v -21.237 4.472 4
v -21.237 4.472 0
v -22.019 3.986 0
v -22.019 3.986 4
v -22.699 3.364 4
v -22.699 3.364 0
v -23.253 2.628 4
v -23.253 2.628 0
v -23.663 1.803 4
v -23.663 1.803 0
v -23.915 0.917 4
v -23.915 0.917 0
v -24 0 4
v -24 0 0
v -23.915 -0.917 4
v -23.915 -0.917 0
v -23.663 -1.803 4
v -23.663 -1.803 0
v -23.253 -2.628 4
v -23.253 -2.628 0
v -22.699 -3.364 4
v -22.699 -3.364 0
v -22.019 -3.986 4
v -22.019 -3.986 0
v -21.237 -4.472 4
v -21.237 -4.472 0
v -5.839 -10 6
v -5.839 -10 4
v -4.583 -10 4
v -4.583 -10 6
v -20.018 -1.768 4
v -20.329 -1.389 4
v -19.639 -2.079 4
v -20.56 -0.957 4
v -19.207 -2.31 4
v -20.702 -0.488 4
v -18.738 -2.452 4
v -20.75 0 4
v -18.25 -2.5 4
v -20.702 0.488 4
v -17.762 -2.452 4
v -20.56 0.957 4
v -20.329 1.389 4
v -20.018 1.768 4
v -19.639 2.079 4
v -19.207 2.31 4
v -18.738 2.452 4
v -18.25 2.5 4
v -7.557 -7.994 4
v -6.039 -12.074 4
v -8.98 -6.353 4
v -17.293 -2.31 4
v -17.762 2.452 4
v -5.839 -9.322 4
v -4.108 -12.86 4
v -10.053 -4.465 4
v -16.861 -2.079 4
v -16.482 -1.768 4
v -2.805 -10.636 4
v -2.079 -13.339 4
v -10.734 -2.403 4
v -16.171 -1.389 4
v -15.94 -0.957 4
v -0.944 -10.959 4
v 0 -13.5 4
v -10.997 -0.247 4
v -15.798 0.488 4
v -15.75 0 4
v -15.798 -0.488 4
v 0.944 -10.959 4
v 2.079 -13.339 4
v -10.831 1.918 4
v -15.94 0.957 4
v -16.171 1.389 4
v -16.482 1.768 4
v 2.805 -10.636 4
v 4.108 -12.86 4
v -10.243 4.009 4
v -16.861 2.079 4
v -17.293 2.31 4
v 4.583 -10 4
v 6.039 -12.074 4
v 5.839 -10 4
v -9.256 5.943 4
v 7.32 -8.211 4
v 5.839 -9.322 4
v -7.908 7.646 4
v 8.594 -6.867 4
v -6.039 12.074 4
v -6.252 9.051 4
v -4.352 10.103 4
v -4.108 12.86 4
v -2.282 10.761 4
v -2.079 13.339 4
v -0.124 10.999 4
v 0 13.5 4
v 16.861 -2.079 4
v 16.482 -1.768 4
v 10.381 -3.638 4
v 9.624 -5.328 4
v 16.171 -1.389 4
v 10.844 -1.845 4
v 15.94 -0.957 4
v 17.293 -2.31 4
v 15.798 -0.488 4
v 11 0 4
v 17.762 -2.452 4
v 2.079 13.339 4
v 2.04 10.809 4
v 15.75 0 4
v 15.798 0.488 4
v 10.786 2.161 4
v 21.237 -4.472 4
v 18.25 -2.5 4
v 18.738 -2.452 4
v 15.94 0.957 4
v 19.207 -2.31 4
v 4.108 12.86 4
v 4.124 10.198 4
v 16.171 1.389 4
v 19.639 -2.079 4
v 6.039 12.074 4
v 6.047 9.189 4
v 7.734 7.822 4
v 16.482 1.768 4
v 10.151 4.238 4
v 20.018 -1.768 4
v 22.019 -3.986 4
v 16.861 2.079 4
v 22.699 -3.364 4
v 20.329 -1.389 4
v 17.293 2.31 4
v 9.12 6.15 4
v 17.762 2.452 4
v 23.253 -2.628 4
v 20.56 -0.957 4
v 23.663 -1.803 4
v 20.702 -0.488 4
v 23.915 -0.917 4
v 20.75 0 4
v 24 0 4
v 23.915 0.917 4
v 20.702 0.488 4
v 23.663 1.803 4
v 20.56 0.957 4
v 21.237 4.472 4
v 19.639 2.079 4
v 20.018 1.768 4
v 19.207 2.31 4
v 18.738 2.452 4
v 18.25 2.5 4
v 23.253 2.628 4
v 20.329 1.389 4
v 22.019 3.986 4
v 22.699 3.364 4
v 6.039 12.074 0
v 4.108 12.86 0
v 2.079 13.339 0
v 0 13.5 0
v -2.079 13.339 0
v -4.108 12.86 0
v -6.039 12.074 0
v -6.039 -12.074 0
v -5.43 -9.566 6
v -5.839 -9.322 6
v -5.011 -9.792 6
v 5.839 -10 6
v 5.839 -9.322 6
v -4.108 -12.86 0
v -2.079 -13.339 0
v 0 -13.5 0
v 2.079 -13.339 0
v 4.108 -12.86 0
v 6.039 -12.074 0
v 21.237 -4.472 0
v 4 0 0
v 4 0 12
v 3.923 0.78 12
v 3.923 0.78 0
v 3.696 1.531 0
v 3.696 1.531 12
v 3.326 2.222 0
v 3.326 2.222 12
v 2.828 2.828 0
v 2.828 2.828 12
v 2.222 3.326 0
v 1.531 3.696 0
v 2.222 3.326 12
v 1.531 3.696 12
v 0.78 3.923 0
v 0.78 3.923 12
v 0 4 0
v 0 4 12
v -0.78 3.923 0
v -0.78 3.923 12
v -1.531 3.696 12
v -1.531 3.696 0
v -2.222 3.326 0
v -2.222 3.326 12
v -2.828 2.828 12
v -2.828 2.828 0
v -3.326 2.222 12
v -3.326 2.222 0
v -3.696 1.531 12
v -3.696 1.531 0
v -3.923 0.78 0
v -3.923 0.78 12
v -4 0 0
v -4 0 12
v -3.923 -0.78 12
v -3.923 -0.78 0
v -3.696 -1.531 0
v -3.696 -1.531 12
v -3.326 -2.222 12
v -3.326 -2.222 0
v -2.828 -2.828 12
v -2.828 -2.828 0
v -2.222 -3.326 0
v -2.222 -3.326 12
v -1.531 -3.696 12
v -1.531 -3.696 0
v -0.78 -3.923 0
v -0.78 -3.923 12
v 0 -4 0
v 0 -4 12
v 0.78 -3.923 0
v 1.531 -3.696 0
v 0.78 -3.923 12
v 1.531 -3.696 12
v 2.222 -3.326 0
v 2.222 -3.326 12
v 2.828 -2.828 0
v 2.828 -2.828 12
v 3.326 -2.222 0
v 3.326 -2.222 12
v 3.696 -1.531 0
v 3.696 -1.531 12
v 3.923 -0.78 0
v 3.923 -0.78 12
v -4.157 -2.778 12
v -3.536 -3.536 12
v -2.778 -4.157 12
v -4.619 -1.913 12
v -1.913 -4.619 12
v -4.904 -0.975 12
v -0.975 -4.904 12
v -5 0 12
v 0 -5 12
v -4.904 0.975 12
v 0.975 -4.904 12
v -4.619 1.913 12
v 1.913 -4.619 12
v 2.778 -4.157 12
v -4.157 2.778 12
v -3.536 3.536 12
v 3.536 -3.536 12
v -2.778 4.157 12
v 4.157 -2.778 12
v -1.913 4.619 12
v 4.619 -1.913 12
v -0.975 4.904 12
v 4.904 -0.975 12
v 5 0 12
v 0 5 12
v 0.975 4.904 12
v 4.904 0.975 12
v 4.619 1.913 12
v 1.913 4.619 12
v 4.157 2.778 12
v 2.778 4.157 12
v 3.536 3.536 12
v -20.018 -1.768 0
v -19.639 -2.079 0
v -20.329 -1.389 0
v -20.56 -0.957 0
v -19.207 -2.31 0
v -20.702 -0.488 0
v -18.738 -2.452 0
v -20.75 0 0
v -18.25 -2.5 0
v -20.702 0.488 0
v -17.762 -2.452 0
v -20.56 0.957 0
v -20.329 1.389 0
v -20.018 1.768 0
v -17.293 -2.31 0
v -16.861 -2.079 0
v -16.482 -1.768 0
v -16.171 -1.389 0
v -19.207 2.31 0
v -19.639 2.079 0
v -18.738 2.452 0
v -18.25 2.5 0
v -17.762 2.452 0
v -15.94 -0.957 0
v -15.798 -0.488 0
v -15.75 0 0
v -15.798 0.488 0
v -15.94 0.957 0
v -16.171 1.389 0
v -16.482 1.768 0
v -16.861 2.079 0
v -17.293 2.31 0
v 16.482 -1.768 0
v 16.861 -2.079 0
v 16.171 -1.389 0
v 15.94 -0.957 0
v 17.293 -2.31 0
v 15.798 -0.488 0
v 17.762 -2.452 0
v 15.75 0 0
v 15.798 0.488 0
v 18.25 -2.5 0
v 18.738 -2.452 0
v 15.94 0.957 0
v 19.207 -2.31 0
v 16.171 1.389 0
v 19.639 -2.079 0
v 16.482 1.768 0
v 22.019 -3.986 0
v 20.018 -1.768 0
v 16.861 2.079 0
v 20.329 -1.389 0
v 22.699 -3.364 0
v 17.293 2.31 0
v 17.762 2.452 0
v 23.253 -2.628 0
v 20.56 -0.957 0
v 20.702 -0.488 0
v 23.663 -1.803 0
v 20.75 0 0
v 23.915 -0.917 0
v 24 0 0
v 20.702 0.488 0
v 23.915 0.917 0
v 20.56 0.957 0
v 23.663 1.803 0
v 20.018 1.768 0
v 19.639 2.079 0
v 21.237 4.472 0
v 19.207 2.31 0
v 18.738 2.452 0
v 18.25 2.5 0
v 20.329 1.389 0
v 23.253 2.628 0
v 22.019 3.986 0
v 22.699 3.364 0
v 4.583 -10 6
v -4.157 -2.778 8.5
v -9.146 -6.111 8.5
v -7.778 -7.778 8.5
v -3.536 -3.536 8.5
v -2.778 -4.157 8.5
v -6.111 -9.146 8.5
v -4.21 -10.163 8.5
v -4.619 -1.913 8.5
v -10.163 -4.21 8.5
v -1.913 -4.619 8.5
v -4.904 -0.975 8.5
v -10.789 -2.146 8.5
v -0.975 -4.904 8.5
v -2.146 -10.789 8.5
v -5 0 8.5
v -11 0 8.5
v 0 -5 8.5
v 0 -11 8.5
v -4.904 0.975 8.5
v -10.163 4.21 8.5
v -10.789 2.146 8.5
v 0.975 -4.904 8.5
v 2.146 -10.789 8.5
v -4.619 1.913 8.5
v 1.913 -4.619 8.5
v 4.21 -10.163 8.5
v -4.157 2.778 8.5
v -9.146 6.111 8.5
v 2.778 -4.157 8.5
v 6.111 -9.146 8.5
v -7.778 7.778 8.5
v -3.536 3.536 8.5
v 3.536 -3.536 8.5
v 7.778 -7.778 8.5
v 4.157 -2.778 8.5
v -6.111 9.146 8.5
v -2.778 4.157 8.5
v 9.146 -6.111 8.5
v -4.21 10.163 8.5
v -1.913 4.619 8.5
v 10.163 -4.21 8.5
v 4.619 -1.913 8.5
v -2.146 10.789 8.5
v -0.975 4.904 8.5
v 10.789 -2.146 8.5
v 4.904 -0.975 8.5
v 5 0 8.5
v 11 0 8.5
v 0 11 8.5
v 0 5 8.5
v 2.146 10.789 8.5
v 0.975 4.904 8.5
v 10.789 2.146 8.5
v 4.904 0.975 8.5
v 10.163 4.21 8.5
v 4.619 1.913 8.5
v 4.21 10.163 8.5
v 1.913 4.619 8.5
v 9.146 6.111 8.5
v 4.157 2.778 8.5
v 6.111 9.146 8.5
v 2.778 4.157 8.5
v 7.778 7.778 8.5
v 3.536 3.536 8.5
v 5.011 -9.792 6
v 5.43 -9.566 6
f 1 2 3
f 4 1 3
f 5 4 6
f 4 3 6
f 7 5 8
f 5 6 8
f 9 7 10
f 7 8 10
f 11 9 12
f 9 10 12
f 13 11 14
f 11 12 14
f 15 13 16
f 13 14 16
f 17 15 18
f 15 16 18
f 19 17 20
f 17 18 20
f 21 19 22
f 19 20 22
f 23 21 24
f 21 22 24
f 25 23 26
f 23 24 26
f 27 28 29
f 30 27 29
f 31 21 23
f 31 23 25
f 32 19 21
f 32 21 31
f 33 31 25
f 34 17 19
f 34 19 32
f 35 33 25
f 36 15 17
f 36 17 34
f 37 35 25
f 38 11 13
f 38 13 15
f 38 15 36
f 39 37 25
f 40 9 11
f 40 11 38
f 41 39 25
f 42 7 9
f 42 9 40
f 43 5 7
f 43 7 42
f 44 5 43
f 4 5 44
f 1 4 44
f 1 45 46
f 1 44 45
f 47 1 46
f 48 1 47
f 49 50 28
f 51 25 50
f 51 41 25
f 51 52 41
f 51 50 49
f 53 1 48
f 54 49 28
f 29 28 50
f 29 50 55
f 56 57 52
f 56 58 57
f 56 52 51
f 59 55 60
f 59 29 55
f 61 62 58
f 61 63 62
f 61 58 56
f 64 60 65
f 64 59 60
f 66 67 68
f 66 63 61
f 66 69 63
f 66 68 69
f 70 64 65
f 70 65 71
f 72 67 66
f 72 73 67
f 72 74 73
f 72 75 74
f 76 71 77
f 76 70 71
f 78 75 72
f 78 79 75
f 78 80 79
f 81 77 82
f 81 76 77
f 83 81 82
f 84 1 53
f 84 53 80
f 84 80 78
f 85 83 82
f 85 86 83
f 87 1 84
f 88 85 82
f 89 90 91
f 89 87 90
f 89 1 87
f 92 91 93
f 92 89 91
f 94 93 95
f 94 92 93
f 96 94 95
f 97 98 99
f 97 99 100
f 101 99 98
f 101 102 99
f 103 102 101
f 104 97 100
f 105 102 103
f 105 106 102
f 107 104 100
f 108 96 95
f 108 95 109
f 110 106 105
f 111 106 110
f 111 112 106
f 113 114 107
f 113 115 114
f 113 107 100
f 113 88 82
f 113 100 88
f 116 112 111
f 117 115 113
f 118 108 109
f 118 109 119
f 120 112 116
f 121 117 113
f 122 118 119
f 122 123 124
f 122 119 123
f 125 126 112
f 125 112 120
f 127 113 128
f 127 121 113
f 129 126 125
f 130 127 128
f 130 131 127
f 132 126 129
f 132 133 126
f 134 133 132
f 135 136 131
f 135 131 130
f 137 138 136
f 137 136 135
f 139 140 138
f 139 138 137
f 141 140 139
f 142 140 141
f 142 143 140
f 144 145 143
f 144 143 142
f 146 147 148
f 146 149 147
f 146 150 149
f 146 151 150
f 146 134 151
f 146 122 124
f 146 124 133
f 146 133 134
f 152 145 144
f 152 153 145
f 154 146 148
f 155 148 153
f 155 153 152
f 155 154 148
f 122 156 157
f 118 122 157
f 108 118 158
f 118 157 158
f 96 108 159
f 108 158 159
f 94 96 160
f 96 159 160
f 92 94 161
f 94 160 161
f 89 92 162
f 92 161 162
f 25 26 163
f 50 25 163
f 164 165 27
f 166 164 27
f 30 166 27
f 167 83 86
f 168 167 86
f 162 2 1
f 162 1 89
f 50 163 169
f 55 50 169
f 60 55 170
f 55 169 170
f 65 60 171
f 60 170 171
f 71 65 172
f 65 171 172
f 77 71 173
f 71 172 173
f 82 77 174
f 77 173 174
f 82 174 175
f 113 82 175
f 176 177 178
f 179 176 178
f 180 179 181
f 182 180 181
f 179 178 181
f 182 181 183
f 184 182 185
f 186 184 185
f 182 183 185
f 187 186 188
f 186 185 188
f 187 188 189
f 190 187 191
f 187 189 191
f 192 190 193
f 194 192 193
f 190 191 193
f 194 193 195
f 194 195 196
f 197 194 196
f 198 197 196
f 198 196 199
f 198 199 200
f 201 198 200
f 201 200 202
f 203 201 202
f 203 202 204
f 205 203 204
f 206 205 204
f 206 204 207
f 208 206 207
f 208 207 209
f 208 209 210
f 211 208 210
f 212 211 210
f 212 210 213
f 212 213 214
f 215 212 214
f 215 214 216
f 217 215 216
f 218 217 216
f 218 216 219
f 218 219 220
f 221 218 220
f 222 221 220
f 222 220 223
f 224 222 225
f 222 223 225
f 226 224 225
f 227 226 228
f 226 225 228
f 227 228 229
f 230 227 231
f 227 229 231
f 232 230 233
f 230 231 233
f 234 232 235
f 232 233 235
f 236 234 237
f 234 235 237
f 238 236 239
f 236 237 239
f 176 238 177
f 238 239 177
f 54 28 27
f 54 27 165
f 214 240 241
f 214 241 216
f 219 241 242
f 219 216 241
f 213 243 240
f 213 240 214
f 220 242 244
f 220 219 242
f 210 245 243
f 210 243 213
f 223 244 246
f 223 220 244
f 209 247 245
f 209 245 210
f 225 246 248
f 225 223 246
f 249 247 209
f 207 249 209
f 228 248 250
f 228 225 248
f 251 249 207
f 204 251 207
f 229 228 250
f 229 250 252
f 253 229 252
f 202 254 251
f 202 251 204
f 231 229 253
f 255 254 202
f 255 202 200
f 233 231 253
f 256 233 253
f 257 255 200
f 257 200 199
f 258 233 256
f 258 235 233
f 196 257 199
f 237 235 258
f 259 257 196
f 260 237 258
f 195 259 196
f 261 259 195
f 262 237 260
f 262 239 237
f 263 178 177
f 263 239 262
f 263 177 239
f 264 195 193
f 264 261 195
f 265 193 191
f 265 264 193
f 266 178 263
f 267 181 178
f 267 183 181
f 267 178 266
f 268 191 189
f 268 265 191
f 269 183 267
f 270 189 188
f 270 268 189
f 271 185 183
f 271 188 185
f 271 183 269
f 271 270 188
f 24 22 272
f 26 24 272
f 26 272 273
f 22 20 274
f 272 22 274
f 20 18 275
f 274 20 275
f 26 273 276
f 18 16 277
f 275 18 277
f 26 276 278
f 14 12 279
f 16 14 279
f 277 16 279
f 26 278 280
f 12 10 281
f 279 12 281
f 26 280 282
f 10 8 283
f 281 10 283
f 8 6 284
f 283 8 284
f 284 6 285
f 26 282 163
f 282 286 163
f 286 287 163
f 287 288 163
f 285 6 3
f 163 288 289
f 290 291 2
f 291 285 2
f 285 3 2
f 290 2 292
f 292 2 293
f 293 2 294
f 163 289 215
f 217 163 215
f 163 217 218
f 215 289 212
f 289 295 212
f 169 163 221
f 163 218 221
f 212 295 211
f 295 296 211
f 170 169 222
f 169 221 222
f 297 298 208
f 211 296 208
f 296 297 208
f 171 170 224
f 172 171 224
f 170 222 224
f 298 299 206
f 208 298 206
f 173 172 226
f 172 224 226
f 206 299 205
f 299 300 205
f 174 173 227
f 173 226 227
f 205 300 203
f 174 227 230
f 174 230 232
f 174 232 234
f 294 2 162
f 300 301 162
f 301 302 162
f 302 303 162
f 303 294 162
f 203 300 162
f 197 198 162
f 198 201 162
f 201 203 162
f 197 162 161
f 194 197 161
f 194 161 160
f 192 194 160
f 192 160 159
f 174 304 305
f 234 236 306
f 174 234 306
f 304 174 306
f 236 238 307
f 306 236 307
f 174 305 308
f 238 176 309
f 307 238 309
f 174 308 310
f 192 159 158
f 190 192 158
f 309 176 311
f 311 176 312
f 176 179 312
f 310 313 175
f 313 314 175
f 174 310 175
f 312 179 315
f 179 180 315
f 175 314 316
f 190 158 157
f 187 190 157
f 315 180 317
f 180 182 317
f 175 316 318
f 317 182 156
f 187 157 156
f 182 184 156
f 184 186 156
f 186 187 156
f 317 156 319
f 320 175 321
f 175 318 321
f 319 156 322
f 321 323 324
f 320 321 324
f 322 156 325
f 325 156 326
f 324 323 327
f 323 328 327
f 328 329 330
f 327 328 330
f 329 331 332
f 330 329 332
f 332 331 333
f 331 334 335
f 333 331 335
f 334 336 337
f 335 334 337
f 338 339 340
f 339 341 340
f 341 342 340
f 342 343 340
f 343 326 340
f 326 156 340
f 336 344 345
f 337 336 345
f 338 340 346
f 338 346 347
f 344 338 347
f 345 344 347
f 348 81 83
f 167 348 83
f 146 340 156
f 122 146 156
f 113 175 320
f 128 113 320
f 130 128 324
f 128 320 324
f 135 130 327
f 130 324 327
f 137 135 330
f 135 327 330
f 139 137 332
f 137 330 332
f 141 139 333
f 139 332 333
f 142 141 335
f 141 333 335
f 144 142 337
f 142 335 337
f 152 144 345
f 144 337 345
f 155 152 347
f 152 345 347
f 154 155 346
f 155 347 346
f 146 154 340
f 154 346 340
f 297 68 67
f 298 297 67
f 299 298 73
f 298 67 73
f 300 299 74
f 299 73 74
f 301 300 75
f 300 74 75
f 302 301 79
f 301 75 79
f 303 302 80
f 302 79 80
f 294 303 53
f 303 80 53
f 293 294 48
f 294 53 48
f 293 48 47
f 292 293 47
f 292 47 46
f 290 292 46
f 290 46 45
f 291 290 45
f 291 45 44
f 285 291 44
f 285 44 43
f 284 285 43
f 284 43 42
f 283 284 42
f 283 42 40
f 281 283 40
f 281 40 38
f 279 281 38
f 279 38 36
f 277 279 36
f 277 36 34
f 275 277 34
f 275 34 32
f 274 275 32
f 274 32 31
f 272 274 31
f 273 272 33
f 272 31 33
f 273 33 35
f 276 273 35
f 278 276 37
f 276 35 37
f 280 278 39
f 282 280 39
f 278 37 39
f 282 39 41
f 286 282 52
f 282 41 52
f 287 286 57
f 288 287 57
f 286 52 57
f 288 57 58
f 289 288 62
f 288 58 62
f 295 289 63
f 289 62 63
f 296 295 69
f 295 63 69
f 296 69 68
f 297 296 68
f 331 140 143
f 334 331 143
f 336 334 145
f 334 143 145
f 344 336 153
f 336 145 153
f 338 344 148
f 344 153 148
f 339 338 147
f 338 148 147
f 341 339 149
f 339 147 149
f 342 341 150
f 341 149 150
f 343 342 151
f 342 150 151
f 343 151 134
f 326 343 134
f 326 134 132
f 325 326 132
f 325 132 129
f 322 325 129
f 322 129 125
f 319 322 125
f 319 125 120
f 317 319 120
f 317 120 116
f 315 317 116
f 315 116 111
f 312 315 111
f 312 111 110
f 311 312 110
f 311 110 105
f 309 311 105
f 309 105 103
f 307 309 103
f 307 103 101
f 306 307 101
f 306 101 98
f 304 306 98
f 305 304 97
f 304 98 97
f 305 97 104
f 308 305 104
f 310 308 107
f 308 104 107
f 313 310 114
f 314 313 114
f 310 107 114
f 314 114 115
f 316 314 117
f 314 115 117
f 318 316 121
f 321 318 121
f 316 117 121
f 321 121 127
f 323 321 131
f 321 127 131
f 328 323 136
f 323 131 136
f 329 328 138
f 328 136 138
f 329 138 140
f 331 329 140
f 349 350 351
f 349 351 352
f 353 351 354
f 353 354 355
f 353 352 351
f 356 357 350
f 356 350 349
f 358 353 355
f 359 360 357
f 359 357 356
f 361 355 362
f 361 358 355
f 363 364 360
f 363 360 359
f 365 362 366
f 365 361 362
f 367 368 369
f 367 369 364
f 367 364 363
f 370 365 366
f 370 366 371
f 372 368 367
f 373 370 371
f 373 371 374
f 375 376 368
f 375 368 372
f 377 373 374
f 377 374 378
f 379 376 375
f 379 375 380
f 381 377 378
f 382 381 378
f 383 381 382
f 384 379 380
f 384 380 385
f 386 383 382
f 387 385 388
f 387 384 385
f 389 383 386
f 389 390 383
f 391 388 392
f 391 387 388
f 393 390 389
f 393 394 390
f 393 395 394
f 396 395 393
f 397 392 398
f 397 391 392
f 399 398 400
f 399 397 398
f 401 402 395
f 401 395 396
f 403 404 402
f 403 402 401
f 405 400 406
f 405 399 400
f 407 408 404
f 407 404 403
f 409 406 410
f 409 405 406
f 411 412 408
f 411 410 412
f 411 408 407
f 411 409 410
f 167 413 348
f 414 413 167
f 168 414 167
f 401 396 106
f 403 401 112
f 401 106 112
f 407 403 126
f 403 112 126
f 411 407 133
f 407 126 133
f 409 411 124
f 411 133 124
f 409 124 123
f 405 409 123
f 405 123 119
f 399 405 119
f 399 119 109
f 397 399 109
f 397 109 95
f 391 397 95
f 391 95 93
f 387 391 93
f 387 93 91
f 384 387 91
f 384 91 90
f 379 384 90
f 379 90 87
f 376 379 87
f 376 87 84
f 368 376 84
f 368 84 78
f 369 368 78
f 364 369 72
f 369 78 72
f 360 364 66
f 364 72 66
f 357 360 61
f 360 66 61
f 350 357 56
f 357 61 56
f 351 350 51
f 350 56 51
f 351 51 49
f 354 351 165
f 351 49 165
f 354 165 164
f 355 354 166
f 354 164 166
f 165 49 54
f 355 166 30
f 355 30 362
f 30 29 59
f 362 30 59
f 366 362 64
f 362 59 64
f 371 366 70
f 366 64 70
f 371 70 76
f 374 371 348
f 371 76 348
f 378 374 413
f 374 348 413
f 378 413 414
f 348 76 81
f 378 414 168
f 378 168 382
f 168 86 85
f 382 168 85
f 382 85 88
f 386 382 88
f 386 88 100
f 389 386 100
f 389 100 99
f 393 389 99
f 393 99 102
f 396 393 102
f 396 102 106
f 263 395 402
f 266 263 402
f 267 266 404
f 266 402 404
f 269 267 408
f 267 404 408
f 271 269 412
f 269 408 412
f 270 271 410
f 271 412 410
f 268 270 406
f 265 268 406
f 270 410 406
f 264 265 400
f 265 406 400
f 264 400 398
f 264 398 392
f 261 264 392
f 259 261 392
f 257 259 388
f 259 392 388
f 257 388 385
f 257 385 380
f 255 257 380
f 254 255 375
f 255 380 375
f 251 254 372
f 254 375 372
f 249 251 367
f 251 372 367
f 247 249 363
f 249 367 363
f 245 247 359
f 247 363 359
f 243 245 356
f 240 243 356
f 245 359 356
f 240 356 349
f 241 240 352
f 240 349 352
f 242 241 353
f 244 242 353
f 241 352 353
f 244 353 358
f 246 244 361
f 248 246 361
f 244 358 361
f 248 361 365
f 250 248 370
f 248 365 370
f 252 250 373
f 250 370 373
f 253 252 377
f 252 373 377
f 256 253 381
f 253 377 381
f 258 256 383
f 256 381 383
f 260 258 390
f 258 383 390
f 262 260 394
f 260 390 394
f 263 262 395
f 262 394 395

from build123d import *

# Parameters (mm, degrees)
PAD_DEPTH       = 4
SKETCH001_R     = 2.5
POCKET_DEPTH    = 4.001
SKETCH002_R     = 11
PAD001_DEPTH    = 4.5
SKETCH003_R     = 5
PAD002_DEPTH    = 3.5
SKETCH004_R     = 4
POCKET001_DEPTH = 12.001
SKETCH005_W     = 11.67783
SKETCH005_H     = 2
PAD003_DEPTH    = 2


with BuildPart() as part:
    # Sketch → Pad (new body)
    with BuildSketch(Plane.XY):
        with BuildLine():
            ThreePointArc((21.236842, -4.471749), (24, 0), (21.236842, 4.471749))
            Line((21.236842, 4.471749), (6.039474, 12.073722))
            ThreePointArc((6.039474, 12.073722), (0, 13.5), (-6.039474, 12.073722))
            Line((-21.236842, 4.471749), (-6.039474, 12.073722))
            ThreePointArc((-21.236842, 4.471749), (-24, 0), (-21.236842, -4.471749))
            Line((-21.236842, -4.471749), (-6.039474, -12.073722))
            ThreePointArc((-6.039474, -12.073722), (0, -13.5), (6.039474, -12.073722))
            Line((6.039474, -12.073722), (21.236842, -4.471749))
        make_face()
    extrude(amount=PAD_DEPTH)

    # Sketch001 (on Face10 of Pad) → Pocket (cut, through all)
    with BuildSketch(Plane.XY.offset(4)):
        with Locations((-18.25, 0)):
            Circle(SKETCH001_R)
        with Locations((18.25, 0)):
            Circle(SKETCH001_R)
    extrude(amount=-POCKET_DEPTH, mode=Mode.SUBTRACT)

    # Sketch002 (on Face5 of Pocket) → Pad001 (join)
    with BuildSketch(Plane.XY.offset(4)):
        Circle(SKETCH002_R)
    extrude(amount=PAD001_DEPTH)

    # Sketch003 (on Face14 of Pad001) → Pad002 (join)
    with BuildSketch(Plane.XY.offset(8.5)):
        Circle(SKETCH003_R)
    extrude(amount=PAD002_DEPTH)

    # Sketch004 (on Face16 of Pad002) → Pocket001 (cut, through all)
    with BuildSketch(Plane.XY.offset(12)):
        Circle(SKETCH004_R)
    extrude(amount=-POCKET001_DEPTH, mode=Mode.SUBTRACT)

    # Sketch005 (on Face5 of Pocket001) → Pad003 (join)
    with BuildSketch(Plane.XY.offset(4)):
        with Locations((0, -9)):
            Rectangle(SKETCH005_W, SKETCH005_H)
    extrude(amount=PAD003_DEPTH)


solid = part.part
